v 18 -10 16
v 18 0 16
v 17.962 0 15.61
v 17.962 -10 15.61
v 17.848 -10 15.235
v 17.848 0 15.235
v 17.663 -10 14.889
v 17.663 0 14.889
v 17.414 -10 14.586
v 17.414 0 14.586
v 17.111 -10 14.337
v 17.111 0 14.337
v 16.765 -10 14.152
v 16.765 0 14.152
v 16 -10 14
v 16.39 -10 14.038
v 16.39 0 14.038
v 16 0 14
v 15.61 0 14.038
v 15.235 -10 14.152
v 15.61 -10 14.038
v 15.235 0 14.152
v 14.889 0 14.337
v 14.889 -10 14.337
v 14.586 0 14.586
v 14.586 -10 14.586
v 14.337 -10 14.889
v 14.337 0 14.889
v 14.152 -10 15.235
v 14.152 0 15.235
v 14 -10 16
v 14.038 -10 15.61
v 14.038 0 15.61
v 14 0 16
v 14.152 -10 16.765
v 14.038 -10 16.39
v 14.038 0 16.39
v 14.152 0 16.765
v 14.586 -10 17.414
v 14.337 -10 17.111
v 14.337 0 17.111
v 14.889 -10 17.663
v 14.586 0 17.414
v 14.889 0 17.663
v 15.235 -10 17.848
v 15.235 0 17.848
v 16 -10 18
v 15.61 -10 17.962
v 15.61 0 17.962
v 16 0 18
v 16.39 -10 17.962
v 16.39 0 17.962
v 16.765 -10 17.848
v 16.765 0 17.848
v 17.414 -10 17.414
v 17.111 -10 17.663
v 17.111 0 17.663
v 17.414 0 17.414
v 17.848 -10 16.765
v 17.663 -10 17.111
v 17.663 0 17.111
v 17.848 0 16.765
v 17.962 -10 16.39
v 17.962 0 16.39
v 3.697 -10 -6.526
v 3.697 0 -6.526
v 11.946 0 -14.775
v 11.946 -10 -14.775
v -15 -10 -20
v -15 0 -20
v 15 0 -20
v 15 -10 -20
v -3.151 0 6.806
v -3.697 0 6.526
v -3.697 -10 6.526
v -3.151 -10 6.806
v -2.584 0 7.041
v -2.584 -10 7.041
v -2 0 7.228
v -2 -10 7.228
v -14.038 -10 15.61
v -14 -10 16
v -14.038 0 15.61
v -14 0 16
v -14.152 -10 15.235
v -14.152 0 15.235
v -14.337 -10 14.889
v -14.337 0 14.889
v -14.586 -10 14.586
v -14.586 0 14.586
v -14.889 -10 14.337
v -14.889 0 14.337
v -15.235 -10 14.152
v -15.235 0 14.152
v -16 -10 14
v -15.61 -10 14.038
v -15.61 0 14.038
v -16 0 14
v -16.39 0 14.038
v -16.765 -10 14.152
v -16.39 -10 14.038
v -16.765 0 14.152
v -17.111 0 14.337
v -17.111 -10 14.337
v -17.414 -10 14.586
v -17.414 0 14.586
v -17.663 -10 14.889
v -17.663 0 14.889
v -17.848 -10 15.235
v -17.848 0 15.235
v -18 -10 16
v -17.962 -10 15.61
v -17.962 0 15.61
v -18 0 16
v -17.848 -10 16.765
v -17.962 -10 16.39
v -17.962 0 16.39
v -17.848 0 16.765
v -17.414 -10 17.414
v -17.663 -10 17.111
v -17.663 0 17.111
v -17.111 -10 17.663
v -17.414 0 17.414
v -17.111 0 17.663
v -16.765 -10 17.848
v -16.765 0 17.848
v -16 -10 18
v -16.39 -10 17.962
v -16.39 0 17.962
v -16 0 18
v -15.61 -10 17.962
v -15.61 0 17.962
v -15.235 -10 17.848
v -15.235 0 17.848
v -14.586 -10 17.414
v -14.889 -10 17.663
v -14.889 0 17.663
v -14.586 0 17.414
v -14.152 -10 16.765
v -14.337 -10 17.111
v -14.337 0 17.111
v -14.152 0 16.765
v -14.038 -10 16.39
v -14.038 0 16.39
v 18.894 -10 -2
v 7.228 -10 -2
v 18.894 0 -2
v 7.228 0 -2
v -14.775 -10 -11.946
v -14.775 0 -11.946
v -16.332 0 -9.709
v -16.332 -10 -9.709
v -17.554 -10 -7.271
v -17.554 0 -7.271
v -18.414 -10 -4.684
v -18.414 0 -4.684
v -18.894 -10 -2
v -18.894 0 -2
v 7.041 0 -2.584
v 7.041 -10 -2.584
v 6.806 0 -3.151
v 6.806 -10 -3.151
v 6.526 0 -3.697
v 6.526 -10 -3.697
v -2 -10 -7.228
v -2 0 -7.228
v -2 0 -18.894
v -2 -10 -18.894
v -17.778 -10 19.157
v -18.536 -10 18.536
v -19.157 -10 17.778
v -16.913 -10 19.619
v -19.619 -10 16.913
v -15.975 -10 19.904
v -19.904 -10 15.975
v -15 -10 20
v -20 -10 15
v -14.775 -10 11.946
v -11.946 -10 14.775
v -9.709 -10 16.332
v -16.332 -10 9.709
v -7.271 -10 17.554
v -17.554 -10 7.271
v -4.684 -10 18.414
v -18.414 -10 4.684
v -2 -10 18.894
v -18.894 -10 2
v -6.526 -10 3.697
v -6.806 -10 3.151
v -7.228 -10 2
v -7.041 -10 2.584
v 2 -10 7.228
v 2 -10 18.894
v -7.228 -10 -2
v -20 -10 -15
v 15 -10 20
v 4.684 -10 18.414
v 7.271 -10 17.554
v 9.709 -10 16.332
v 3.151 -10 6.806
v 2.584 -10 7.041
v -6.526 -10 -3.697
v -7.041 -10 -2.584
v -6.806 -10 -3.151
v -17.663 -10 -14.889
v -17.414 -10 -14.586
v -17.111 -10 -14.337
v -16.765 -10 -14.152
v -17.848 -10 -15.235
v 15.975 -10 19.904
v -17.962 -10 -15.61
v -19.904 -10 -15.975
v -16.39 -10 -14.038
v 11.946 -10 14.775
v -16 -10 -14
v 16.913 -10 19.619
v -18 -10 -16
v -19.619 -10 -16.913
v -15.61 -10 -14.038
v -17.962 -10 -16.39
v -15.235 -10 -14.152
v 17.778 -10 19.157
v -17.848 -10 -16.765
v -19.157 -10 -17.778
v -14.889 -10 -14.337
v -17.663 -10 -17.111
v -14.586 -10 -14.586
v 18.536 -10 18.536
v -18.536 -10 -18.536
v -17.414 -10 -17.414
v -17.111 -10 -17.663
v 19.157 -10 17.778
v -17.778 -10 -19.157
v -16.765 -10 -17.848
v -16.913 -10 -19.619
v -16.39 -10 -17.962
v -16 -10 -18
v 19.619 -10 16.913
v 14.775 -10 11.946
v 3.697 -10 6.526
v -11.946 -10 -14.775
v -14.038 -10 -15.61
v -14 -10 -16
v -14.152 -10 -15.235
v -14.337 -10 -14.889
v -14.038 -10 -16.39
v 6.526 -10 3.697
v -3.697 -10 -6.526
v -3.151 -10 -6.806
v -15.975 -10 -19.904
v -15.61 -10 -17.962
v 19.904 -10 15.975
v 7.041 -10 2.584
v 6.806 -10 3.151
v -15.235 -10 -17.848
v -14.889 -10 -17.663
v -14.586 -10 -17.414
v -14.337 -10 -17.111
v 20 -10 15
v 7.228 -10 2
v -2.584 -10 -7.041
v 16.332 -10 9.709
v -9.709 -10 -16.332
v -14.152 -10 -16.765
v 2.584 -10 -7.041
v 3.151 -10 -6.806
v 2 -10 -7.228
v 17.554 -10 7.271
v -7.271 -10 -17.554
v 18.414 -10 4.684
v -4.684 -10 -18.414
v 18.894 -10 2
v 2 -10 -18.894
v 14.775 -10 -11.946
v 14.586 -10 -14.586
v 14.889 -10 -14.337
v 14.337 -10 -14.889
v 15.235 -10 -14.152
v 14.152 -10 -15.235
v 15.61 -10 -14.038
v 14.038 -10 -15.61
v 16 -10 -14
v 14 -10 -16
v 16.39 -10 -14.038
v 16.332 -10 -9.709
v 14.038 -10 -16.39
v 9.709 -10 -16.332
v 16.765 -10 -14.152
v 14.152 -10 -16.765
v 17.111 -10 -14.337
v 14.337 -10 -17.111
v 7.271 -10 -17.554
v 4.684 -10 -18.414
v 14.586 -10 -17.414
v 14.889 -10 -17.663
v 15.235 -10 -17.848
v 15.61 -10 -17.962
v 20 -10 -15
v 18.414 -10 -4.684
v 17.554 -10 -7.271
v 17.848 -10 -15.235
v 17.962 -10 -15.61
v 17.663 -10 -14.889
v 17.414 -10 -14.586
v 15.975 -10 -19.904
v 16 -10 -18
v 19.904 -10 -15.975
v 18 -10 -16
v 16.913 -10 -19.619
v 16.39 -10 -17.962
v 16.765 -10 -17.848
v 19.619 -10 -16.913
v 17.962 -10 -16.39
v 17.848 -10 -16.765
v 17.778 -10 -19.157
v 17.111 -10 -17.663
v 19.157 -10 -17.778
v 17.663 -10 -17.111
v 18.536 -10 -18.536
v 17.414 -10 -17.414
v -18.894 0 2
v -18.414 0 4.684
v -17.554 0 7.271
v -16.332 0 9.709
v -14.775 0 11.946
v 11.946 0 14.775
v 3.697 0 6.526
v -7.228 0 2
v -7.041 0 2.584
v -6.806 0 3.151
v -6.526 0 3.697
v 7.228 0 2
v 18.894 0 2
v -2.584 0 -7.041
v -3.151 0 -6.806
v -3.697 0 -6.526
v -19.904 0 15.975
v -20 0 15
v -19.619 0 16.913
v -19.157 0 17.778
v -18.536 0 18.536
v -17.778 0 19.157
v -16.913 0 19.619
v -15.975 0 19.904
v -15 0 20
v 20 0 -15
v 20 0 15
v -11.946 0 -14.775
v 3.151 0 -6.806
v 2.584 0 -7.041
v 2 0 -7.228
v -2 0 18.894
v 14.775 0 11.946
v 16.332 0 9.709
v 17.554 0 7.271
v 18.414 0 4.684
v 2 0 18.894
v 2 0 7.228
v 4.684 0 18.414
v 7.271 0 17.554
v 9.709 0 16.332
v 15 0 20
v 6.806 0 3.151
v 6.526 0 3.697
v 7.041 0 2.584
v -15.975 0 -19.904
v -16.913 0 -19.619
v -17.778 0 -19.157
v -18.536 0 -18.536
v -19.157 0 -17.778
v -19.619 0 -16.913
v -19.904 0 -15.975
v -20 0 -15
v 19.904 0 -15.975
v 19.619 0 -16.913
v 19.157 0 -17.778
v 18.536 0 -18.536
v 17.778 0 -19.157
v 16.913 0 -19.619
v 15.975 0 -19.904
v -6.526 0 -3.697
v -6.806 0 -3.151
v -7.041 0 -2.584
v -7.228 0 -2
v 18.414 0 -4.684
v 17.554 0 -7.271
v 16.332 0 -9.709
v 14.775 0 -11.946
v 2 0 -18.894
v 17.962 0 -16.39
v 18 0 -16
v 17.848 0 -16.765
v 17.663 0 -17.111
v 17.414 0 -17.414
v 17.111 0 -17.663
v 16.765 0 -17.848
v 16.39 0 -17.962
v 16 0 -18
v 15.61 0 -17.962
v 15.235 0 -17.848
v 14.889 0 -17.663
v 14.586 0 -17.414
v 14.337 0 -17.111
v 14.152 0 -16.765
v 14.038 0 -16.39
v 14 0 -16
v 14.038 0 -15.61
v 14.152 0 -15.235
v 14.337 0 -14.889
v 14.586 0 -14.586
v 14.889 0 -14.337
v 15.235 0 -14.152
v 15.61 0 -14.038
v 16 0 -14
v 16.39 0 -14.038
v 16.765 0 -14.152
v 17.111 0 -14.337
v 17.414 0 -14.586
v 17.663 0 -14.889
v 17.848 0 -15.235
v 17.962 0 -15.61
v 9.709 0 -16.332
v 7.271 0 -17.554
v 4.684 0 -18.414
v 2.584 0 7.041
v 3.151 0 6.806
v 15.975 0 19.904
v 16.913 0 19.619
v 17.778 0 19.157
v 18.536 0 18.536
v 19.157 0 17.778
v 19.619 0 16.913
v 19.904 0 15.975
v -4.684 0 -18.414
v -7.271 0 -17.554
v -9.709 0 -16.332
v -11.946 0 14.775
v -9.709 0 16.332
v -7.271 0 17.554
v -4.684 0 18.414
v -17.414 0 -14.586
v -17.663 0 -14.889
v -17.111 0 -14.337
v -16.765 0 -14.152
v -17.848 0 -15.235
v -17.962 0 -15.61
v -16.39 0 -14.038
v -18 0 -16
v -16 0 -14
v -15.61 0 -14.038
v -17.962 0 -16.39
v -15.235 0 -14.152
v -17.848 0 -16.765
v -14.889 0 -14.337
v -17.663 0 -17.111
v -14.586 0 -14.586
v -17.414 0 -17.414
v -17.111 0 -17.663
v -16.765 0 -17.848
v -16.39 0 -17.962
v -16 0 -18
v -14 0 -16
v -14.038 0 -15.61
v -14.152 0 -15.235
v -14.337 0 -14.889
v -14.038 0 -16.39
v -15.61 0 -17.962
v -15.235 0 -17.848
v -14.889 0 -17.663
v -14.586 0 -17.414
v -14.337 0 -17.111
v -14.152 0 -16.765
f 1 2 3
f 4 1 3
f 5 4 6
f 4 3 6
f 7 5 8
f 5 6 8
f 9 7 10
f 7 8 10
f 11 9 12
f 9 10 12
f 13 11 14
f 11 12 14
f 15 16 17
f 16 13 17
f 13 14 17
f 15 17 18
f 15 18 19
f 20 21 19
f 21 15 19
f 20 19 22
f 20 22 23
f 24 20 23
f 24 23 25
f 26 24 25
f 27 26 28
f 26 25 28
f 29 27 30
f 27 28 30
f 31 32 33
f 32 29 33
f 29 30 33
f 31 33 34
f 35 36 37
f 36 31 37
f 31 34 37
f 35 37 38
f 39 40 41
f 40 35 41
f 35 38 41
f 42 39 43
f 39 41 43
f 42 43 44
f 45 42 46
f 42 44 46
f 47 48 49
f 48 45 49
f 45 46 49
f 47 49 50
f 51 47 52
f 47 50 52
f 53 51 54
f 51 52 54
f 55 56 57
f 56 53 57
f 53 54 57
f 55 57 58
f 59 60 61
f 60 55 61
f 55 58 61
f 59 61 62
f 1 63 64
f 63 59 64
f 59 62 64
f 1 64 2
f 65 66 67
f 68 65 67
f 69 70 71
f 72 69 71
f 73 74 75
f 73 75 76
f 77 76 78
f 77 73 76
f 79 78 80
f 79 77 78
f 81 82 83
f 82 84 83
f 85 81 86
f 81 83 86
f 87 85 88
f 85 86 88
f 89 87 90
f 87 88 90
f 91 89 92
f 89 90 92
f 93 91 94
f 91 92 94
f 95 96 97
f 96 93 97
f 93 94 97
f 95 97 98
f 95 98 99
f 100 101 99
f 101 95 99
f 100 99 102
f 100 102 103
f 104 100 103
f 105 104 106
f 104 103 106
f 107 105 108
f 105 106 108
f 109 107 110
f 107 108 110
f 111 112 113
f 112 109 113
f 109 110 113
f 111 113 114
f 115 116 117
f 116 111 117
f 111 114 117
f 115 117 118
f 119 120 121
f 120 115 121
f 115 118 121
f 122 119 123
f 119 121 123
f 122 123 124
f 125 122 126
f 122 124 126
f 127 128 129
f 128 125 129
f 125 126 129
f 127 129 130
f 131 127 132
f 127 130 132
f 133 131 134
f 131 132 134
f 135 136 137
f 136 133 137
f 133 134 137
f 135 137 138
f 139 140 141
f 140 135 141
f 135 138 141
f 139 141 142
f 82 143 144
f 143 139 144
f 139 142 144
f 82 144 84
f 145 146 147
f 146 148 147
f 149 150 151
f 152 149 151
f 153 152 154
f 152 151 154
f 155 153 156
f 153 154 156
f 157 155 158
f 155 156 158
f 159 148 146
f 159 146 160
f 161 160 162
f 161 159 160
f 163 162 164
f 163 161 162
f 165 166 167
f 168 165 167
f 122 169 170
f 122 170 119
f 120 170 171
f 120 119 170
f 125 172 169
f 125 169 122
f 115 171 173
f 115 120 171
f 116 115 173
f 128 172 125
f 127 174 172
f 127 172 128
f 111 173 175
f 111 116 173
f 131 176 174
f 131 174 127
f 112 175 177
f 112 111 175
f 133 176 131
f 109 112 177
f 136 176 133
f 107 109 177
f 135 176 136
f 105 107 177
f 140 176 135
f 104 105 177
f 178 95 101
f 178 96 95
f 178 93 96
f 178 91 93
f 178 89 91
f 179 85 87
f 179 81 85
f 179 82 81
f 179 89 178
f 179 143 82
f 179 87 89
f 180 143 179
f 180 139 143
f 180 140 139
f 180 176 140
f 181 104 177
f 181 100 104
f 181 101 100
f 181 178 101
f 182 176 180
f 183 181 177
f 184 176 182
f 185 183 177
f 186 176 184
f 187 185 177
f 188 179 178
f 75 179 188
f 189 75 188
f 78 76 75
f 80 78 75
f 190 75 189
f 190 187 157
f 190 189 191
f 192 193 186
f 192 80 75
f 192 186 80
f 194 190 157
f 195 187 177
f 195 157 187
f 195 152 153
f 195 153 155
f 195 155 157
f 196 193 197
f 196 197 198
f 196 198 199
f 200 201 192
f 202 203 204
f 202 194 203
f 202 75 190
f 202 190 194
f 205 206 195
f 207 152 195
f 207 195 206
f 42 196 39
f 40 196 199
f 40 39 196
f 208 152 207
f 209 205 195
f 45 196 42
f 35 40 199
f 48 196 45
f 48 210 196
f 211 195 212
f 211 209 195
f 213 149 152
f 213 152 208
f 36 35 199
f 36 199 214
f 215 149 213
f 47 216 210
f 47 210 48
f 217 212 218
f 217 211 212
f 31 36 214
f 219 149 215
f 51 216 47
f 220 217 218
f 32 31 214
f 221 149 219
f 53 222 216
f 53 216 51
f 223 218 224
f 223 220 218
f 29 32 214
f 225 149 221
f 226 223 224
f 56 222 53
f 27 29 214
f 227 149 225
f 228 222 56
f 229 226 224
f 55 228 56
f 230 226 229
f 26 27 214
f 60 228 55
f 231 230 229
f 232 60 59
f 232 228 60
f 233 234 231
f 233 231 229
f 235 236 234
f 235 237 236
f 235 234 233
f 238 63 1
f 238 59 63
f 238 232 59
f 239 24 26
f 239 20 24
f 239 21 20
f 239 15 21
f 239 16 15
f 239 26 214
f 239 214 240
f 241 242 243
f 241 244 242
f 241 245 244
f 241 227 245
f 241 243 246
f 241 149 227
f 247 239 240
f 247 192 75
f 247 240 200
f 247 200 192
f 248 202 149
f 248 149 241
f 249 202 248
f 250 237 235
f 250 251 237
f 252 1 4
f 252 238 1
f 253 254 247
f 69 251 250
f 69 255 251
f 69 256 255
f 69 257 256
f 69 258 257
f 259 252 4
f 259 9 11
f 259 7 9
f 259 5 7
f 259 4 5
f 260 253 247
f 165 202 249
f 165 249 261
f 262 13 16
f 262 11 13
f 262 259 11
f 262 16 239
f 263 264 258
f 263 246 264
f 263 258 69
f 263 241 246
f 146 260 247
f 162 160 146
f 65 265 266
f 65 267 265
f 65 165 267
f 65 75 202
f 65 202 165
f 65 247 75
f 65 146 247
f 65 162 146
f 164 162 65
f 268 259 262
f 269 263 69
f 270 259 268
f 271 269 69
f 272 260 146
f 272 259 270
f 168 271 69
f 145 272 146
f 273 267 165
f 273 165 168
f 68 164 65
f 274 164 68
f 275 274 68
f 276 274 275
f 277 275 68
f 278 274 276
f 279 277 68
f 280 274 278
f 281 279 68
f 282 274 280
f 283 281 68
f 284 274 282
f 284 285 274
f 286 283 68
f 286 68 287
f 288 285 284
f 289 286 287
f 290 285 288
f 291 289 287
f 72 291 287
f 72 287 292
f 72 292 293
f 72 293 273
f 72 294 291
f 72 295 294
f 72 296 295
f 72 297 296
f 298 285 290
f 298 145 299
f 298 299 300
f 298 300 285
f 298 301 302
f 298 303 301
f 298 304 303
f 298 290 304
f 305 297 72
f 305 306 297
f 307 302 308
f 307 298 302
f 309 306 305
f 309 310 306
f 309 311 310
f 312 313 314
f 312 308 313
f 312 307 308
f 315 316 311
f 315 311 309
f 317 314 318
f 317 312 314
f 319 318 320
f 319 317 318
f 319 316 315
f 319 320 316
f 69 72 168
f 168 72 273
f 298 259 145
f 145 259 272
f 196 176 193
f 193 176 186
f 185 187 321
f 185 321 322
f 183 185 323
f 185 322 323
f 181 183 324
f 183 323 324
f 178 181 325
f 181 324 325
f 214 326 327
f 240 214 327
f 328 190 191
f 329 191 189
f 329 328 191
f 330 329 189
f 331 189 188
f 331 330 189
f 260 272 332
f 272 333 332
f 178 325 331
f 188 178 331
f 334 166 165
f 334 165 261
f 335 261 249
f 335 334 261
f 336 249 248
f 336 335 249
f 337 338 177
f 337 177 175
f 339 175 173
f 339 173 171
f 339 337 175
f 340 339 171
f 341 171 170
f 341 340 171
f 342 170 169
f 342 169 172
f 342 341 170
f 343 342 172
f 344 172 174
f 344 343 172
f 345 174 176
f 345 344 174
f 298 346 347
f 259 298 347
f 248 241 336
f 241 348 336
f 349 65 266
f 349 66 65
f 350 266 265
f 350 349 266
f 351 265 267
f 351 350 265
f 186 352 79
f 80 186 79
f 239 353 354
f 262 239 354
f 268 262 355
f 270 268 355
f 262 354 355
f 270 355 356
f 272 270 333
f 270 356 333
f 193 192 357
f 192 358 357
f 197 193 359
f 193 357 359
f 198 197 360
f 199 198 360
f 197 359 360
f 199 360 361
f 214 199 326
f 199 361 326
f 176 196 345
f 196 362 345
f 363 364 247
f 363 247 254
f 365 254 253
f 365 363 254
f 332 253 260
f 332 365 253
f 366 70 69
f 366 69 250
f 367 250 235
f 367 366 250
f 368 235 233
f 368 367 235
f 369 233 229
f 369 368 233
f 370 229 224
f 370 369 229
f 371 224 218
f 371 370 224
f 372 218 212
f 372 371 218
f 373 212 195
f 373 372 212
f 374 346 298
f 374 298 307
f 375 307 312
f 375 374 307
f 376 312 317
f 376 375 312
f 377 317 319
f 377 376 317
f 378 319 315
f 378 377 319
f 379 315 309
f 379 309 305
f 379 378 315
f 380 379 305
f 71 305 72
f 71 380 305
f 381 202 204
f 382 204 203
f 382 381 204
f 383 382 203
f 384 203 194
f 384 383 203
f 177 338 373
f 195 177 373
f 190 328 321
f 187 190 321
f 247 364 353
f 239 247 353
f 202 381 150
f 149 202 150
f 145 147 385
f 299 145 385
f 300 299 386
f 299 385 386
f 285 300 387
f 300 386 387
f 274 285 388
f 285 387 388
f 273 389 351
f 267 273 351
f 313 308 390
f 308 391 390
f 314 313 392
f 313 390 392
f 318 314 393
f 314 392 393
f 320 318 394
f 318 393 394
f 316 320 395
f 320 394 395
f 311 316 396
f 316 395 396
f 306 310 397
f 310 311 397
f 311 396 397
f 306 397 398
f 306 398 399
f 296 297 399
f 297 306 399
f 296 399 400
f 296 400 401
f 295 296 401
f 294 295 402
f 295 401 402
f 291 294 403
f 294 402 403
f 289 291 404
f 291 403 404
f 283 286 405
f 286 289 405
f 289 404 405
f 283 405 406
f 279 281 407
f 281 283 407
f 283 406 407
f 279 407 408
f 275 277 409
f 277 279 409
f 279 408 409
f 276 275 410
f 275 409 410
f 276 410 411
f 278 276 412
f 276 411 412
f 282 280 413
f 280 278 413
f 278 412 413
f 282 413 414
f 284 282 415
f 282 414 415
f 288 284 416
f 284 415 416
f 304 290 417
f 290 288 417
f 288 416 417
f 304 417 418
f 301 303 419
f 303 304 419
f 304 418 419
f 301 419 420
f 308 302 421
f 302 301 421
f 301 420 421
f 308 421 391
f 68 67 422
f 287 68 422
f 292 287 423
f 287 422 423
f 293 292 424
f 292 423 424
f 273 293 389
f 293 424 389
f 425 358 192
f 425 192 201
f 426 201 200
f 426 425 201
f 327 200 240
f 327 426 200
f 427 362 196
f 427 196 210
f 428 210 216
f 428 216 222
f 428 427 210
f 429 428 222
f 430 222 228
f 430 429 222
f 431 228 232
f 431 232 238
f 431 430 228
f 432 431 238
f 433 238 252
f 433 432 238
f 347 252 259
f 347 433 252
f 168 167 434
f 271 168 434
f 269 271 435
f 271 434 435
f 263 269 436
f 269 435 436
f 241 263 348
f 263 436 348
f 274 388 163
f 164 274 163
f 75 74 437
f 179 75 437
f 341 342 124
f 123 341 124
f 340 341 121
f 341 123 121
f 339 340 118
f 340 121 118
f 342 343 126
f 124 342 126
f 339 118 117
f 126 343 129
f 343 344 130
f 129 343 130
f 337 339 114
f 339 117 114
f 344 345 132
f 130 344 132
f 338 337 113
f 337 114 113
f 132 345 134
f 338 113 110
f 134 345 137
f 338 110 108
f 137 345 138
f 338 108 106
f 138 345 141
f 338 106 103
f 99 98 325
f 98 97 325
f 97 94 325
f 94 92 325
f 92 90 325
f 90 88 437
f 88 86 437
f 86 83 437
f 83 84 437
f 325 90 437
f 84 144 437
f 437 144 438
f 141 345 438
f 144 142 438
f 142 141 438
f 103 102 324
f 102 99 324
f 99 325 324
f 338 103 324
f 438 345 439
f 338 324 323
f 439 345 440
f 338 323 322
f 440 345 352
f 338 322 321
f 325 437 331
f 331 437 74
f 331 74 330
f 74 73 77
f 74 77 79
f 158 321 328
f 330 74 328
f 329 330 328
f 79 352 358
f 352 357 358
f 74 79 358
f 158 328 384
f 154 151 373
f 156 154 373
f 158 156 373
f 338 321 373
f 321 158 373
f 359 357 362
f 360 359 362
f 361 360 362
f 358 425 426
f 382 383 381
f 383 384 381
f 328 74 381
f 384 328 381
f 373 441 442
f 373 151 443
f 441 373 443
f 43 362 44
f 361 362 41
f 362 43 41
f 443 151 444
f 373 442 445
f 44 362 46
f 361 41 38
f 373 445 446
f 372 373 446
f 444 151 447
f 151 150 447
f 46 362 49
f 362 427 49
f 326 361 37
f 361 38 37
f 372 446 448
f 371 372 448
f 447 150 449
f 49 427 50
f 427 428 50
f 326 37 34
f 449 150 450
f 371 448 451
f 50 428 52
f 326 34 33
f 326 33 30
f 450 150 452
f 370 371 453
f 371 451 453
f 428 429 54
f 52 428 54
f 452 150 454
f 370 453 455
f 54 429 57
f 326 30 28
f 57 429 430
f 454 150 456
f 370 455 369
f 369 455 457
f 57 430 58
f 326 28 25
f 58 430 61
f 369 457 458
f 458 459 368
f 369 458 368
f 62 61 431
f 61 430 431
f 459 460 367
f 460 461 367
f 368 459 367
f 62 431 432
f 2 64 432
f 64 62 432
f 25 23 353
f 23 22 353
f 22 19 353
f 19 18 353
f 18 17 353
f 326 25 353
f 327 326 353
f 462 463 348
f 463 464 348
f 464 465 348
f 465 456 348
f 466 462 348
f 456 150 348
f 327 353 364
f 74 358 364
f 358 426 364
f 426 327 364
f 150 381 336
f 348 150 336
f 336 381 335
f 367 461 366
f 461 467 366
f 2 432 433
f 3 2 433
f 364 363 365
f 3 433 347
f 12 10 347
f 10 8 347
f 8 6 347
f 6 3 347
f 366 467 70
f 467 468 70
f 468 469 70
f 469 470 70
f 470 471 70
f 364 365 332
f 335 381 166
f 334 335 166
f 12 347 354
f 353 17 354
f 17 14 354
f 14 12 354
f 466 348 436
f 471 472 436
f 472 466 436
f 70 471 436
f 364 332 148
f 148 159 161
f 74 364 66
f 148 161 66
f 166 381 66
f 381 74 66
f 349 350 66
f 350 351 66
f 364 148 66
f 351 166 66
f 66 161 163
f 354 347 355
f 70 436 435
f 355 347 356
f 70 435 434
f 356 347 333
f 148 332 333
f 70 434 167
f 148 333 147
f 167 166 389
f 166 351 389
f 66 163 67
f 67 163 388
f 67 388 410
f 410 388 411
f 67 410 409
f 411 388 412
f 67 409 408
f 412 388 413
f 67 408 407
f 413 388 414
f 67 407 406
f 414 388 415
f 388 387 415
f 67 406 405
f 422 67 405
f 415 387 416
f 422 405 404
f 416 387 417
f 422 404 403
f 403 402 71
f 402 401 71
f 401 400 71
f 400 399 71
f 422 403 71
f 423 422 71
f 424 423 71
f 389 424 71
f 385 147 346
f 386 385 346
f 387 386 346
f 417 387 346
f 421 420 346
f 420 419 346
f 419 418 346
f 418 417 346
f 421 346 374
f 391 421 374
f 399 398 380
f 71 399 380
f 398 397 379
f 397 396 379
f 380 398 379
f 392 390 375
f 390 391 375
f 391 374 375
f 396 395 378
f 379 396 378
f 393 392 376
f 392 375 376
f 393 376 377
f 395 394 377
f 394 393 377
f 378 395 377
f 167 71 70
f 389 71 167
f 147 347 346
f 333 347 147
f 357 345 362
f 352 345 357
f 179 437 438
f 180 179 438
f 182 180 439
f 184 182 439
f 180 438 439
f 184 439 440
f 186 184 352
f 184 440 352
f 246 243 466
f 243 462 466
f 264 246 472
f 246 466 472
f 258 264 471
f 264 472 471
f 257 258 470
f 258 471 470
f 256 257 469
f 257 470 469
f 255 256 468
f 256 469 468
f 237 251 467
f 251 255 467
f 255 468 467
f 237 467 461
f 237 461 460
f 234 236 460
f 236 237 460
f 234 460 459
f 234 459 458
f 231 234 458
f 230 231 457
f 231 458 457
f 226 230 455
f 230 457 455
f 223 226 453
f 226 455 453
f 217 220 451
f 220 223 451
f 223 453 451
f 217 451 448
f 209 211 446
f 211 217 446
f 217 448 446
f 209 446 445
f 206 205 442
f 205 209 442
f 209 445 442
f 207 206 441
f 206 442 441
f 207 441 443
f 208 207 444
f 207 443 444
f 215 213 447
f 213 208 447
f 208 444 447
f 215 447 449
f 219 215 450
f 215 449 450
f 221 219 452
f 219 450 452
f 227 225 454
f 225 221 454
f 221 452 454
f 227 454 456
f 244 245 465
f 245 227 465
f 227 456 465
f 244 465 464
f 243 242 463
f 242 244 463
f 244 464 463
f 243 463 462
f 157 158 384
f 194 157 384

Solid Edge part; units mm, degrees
sketch "Sketch1" plane through (0, 0, 0) normal (0, -1, 0) x (1, 0, 0)
  circle A0 centre (16, 16) radius 2
  circle A1 centre (-16, 16) radius 2
  circle A2 centre (-16, -16) radius 2
  circle A3 centre (16, -16) radius 2
  line L0 (-2, -7.2284) -> (-2, -18.8944)
  arc A4 (-2, -18.8944) -> (-11.9462, -14.7746) centre (0, 0) cw
  line L1 (-11.9462, -14.7746) -> (-3.697, -6.5255)
  arc A5 (-2, -7.2284) -> (-3.697, -6.5255) centre (0, 0) cw
  arc A6 (18.8944, -2) -> (14.7746, -11.9462) centre (0, 0) cw
  line L2 (14.7746, -11.9462) -> (6.5255, -3.697)
  line L3 (7.2284, -2) -> (18.8944, -2)
  arc A7 (6.5255, -3.697) -> (7.2284, -2) centre (0, 0) ccw
  line L4 (-14.7746, 11.9462) -> (-6.5255, 3.697)
  arc A8 (-7.2284, 2) -> (-6.5255, 3.697) centre (0, 0) cw
  line L5 (-7.2284, 2) -> (-18.8944, 2)
  arc A9 (-18.8944, 2) -> (-14.7746, 11.9462) centre (0, 0) cw
  line L6 (-2, 18.8944) -> (-2, 7.2284)
  arc A10 (-3.697, 6.5255) -> (-2, 7.2284) centre (0, 0) cw
  line L7 (-3.697, 6.5255) -> (-11.9462, 14.7746)
  arc A11 (-11.9462, 14.7746) -> (-2, 18.8944) centre (0, 0) cw
  arc A12 (-6.5255, -3.697) -> (-7.2284, -2) centre (0, 0) cw
  line L8 (-18.8944, -2) -> (-7.2284, -2)
  arc A13 (-14.7746, -11.9462) -> (-18.8944, -2) centre (0, 0) cw
  line L9 (-6.5255, -3.697) -> (-14.7746, -11.9462)
  line L10 (2, 7.2284) -> (2, 18.8944)
  arc A14 (2, 18.8944) -> (11.9462, 14.7746) centre (0, 0) cw
  line L11 (11.9462, 14.7746) -> (3.697, 6.5255)
  arc A15 (2, 7.2284) -> (3.697, 6.5255) centre (0, 0) cw
  line L12 (2, -18.8944) -> (2, -7.2284)
  arc A16 (3.697, -6.5255) -> (2, -7.2284) centre (0, 0) cw
  line L13 (3.697, -6.5255) -> (11.9462, -14.7746)
  arc A17 (11.9462, -14.7746) -> (2, -18.8944) centre (0, 0) cw
  line L14 (18.8944, 2) -> (7.2284, 2)
  arc A18 (6.5255, 3.697) -> (7.2284, 2) centre (0, 0) cw
  line L15 (6.5255, 3.697) -> (14.7746, 11.9462)
  arc A19 (14.7746, 11.9462) -> (18.8944, 2) centre (0, 0) cw
  line L16 (-15, -20) -> (15, -20)
  arc A20 (20, -15) -> (15, -20) centre (15, -15) cw
  line L17 (20, -15) -> (20, 15)
  arc A21 (15, 20) -> (20, 15) centre (15, 15) cw
  line L18 (15, 20) -> (-15, 20)
  arc A22 (-20, 15) -> (-15, 20) centre (-15, 15) cw
  line L19 (-20, 15) -> (-20, -15)
  arc A23 (-20, -15) -> (-15, -20) centre (-15, -15) ccw
extrude "Protrusion1" add sketch "Sketch1" along normal blind 10
